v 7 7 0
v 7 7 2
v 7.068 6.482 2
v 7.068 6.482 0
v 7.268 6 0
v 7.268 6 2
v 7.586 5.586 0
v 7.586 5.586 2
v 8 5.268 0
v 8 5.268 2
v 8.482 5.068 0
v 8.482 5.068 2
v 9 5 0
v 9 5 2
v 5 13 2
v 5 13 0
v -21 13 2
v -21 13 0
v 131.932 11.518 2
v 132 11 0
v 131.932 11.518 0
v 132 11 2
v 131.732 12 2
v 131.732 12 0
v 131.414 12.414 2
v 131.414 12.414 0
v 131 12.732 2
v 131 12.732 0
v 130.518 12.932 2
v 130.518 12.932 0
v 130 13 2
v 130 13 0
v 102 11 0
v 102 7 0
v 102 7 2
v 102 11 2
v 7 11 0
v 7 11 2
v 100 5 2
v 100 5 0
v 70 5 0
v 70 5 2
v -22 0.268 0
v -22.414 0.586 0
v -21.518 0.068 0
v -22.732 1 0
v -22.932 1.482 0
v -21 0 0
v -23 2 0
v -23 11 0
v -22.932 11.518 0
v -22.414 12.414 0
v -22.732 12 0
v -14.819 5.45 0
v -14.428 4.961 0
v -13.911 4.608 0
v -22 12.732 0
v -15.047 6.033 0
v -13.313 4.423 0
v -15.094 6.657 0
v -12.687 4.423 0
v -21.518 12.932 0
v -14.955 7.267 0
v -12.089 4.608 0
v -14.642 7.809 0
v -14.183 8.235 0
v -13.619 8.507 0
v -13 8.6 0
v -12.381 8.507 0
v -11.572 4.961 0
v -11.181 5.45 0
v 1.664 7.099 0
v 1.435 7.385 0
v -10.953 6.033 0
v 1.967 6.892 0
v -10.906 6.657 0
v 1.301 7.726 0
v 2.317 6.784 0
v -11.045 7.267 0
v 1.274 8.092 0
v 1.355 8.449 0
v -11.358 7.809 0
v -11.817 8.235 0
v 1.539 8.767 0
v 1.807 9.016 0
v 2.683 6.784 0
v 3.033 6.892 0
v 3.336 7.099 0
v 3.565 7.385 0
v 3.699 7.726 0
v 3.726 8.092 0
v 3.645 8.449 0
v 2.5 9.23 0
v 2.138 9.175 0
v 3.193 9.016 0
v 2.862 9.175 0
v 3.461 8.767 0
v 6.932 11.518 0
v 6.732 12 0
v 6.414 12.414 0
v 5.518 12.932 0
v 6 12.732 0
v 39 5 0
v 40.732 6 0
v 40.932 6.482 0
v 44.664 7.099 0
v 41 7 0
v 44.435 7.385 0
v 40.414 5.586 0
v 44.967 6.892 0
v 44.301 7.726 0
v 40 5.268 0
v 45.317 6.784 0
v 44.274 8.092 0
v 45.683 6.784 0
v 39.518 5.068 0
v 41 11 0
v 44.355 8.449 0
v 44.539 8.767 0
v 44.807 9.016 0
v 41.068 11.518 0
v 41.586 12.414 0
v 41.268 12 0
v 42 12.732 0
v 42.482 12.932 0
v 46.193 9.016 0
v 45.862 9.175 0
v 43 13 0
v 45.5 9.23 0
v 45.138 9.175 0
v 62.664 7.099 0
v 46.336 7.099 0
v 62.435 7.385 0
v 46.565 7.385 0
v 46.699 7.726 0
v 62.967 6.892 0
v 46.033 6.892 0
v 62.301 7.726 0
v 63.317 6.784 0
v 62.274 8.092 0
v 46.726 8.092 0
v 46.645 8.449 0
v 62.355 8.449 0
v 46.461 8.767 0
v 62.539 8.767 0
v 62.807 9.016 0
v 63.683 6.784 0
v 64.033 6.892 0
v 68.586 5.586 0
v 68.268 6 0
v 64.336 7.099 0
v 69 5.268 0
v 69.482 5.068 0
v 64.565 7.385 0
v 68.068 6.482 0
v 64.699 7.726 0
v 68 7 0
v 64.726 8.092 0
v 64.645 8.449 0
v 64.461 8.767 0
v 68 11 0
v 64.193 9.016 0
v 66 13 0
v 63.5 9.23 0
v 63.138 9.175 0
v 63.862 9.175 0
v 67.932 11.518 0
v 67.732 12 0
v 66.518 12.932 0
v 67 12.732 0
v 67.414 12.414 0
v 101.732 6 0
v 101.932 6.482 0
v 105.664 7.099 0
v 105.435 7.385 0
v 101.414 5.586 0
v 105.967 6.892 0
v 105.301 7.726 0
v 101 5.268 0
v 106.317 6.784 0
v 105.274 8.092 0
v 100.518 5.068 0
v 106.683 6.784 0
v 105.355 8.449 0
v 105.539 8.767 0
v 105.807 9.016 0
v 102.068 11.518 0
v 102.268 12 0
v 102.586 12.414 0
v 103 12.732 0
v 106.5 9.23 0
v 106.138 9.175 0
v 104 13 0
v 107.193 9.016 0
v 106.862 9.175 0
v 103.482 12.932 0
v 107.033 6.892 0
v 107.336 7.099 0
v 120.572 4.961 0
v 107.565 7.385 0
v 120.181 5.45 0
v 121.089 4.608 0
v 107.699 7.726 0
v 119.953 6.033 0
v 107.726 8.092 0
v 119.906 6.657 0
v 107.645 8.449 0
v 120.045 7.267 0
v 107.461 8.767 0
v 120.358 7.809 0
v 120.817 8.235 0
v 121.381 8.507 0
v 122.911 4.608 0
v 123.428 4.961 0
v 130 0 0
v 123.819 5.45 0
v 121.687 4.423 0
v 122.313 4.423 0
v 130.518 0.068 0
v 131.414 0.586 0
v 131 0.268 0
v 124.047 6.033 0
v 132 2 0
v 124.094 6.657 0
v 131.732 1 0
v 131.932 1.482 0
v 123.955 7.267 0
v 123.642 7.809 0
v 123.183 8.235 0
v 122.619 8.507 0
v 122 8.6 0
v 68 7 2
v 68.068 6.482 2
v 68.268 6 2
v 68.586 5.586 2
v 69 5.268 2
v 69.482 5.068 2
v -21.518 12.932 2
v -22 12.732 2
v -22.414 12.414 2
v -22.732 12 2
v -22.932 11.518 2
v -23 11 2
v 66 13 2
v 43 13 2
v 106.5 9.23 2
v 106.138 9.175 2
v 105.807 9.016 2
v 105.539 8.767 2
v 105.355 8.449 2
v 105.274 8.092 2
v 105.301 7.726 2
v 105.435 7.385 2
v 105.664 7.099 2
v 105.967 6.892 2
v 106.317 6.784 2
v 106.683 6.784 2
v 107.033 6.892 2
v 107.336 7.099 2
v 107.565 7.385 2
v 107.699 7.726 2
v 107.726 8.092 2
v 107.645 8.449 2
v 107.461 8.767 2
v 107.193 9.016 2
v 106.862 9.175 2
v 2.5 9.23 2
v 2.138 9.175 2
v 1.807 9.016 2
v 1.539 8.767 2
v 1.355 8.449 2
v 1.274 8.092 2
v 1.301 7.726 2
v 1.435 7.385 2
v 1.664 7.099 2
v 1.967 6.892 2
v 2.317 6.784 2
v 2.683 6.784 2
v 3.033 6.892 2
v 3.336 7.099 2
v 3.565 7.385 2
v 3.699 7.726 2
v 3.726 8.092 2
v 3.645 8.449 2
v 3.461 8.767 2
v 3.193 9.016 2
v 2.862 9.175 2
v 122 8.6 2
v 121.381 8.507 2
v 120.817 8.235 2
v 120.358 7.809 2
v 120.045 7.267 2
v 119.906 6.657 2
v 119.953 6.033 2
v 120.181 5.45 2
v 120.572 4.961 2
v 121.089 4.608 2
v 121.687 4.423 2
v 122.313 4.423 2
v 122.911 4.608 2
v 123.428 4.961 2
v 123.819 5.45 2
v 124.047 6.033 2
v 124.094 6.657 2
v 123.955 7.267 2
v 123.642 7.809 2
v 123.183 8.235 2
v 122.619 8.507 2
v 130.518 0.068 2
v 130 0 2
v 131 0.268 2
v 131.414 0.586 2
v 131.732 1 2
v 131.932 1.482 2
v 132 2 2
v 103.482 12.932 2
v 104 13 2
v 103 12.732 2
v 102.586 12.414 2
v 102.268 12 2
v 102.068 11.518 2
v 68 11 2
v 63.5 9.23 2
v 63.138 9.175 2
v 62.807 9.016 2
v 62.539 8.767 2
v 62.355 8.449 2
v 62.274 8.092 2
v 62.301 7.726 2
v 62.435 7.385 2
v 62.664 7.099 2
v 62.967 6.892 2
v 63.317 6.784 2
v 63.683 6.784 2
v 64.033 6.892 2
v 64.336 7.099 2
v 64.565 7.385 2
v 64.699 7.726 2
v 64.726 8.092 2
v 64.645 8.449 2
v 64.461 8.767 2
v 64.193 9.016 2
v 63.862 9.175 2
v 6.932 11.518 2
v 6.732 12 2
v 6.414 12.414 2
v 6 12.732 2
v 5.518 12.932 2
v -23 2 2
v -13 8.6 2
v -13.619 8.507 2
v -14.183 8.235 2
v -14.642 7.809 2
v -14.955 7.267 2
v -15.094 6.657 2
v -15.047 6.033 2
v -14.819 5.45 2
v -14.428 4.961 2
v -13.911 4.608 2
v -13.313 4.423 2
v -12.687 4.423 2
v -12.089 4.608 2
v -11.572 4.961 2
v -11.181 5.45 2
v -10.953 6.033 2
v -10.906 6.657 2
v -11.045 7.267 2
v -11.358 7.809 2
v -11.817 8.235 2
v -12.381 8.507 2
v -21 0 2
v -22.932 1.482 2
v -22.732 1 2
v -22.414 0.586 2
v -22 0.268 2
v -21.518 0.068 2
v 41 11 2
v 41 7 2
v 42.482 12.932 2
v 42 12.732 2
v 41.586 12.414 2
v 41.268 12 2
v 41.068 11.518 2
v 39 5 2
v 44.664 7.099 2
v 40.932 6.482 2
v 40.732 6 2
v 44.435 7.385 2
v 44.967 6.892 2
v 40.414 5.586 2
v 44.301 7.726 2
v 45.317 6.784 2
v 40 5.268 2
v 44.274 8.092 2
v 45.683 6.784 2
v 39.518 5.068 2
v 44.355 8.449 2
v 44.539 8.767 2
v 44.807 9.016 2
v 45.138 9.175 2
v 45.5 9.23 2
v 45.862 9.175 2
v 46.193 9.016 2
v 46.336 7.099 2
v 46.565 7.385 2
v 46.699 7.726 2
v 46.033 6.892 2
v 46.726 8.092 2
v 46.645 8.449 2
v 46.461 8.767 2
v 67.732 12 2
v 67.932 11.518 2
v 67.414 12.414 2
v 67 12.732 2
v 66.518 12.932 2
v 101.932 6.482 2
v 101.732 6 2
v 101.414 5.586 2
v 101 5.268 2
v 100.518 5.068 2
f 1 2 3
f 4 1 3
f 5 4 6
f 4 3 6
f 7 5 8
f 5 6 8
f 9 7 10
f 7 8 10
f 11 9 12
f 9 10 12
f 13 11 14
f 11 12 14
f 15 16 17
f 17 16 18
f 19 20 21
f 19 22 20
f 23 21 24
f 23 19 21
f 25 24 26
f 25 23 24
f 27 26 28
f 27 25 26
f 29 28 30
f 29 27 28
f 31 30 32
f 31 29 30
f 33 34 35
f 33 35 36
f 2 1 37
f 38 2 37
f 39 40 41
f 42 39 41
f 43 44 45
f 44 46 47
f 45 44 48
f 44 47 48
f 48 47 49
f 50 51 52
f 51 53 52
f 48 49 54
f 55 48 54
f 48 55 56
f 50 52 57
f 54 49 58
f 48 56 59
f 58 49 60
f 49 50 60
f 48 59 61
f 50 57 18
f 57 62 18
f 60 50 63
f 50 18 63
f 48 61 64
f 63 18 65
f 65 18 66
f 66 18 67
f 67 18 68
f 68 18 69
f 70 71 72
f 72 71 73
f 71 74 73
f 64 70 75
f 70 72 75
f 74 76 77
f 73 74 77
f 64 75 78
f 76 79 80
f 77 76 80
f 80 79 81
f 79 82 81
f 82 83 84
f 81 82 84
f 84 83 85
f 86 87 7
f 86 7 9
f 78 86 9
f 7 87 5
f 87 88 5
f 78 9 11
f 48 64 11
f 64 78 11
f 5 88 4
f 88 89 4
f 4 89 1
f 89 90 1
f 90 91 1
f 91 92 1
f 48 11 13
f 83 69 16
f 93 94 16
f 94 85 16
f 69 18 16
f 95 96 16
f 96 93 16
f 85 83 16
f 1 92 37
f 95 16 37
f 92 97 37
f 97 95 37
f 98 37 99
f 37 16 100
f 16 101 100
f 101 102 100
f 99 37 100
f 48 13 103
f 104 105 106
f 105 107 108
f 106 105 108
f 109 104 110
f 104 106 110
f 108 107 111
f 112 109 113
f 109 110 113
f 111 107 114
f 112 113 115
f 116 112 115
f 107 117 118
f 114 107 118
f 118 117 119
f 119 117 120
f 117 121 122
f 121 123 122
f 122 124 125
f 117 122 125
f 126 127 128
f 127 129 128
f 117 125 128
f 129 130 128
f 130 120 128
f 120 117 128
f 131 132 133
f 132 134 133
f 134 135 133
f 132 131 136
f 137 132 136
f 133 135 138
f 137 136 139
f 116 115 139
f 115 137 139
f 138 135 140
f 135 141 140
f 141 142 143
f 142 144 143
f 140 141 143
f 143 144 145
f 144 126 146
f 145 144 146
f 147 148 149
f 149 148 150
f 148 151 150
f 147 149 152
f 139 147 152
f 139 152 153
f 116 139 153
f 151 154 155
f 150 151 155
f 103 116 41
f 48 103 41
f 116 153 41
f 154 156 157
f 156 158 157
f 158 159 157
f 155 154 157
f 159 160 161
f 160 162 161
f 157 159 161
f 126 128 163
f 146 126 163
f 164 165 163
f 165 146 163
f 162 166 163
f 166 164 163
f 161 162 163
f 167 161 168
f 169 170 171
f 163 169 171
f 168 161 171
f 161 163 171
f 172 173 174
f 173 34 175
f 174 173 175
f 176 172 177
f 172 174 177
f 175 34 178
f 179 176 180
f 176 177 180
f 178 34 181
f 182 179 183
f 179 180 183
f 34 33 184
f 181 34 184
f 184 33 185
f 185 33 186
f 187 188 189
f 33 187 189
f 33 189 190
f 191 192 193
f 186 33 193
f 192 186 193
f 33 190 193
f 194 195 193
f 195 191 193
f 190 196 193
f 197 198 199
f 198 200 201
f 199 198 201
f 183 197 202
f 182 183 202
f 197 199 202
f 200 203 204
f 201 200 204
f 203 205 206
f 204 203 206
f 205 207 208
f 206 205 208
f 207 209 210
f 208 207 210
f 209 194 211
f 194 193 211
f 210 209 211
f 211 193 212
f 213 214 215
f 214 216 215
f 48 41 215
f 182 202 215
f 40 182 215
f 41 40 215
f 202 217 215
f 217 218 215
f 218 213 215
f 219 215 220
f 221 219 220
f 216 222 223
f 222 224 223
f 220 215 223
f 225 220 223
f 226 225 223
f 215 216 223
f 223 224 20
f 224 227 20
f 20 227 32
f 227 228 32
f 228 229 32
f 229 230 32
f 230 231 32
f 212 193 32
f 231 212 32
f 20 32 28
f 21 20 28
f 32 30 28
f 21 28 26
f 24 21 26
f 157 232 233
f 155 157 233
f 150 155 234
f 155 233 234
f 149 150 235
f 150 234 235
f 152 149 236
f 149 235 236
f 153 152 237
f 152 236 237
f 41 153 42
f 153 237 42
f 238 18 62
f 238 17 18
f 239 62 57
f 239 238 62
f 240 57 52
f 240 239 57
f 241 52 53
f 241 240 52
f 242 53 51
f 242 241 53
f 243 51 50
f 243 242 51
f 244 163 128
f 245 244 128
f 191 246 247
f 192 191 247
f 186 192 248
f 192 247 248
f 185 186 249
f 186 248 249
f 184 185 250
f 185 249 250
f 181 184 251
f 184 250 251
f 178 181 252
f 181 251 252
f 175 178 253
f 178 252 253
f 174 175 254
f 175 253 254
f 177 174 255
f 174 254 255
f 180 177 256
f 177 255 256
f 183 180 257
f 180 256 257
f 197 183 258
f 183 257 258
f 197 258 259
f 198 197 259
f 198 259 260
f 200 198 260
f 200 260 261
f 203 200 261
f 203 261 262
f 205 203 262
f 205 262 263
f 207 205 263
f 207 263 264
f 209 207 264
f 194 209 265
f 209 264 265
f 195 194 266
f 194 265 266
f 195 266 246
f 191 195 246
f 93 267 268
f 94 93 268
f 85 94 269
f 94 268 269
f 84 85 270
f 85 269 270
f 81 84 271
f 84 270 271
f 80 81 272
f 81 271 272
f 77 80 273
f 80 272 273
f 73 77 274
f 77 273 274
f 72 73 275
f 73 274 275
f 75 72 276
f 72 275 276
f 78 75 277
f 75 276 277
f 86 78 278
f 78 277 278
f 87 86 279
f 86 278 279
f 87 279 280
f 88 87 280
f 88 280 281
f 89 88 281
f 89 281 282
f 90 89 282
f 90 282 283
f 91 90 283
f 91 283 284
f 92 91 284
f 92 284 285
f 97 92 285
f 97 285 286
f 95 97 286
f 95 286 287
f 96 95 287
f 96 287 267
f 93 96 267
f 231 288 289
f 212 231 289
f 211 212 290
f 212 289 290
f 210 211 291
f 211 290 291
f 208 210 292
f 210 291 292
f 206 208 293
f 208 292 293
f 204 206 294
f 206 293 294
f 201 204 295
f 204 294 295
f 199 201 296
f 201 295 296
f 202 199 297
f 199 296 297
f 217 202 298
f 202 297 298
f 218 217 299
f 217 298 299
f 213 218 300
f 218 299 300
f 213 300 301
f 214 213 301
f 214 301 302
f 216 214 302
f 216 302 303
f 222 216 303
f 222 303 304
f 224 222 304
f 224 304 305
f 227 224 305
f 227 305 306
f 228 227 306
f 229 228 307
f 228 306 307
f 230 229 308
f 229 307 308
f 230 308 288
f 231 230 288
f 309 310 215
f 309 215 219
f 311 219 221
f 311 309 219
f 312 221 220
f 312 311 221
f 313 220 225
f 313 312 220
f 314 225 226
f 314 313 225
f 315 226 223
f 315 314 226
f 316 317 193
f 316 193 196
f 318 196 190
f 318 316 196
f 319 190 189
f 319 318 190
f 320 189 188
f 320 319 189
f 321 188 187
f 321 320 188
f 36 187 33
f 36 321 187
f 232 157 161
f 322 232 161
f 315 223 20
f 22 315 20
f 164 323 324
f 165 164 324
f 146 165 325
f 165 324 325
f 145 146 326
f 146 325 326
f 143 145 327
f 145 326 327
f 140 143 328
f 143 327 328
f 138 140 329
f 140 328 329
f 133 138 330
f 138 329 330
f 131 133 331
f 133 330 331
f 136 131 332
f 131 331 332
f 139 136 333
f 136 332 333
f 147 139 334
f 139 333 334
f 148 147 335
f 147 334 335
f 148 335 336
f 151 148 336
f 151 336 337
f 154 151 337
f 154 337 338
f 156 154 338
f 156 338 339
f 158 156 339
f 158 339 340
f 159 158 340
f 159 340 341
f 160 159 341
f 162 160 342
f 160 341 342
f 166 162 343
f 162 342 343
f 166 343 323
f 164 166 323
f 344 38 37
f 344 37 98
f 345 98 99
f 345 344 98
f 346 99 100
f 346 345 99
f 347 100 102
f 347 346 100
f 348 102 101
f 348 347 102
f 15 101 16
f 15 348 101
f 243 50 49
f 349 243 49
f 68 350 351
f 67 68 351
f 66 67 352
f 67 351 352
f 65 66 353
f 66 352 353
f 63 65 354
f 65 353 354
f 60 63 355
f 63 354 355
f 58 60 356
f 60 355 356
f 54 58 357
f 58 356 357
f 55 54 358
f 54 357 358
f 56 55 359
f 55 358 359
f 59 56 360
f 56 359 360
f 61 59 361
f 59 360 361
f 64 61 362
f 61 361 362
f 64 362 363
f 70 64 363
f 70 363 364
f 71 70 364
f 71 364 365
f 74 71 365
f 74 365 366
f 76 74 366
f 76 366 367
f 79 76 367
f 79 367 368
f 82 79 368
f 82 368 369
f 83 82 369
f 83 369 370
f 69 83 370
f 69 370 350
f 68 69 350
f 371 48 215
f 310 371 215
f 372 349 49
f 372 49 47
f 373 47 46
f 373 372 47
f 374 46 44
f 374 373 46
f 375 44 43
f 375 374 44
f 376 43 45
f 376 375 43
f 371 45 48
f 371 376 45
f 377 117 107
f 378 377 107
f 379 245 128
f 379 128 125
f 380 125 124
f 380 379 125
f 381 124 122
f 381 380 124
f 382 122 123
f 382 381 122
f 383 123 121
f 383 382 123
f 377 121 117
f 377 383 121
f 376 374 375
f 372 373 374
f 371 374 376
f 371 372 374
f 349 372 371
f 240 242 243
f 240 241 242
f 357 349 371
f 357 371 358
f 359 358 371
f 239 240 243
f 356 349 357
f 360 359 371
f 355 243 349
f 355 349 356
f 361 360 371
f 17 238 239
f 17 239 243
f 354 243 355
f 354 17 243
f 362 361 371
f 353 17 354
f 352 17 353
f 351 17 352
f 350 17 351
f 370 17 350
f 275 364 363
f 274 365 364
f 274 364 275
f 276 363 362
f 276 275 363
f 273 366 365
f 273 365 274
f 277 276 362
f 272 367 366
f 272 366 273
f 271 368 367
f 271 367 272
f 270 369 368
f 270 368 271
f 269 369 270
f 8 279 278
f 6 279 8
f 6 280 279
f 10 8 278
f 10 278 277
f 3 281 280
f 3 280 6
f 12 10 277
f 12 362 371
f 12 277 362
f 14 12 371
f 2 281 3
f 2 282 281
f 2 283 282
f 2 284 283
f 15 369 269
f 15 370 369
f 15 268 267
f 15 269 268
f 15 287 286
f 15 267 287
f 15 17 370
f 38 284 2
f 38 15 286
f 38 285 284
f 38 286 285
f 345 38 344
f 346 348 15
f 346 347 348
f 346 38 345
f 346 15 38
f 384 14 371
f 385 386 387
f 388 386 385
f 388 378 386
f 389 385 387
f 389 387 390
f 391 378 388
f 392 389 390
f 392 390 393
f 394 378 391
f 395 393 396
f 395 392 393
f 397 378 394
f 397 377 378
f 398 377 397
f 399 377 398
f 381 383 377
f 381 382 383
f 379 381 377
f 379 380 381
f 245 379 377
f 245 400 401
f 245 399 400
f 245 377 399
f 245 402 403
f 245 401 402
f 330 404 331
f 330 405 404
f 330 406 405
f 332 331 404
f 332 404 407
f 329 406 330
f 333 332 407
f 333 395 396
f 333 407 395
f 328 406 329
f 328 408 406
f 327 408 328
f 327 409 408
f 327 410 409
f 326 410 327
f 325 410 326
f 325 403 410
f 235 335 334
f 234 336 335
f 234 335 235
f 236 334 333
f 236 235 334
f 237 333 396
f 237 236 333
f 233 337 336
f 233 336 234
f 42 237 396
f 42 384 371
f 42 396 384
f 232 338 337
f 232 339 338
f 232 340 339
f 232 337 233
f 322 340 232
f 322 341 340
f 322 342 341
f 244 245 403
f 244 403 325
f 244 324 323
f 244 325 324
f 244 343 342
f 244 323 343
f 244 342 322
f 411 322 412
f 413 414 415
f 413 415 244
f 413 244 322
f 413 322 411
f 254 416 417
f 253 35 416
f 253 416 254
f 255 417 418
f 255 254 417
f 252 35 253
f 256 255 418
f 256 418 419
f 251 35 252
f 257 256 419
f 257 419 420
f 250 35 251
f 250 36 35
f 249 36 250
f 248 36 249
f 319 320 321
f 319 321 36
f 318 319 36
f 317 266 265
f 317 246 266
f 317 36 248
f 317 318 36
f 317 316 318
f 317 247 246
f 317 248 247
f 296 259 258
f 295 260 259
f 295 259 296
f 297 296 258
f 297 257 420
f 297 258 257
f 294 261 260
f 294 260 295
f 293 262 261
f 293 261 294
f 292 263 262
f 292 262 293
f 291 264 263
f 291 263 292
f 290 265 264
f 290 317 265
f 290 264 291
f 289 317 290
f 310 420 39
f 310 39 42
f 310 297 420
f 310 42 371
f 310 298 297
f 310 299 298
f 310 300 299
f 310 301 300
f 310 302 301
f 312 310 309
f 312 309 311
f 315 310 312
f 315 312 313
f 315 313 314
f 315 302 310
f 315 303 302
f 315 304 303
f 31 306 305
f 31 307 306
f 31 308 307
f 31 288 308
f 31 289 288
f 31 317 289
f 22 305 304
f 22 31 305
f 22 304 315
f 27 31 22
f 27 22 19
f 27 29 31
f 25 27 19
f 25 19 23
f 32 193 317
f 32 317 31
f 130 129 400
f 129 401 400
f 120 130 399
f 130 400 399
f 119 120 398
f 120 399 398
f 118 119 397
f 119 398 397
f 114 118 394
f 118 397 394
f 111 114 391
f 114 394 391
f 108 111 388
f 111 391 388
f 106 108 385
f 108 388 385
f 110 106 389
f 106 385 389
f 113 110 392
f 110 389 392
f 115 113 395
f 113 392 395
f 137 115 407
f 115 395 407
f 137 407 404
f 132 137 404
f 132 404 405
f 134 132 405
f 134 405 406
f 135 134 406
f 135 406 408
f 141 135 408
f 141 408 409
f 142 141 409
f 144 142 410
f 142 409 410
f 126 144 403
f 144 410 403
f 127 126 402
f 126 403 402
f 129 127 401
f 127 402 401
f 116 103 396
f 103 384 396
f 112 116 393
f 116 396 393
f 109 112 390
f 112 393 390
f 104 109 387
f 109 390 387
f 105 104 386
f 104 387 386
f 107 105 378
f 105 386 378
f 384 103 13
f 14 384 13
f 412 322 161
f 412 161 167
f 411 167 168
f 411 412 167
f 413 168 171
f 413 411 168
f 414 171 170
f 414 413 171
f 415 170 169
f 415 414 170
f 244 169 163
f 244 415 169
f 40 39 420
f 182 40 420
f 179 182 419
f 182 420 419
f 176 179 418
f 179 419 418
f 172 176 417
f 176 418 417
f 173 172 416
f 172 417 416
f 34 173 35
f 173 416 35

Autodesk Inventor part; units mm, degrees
ref_plane "YZ Plane" through (0, 0, 0) normal (1, 0, 0) x (0, 1, 0)
ref_plane "XZ Plane" through (0, 0, 0) normal (0, 1, 0) x (-1, 0, 0)
ref_plane "XY Plane" through (0, 0, 0) normal (0, 0, 1) x (1, 0, 0)
sketch "Skizze1" plane through (0, 0, 0) normal (0, 0, 1) x (1, 0, 0)
  circle A0 centre (2.5, 77) radius 1.875 construction
  circle A1 centre (45.5, 77) radius 1.875 construction
  circle A2 centre (2.5, 8) radius 1.875 construction
  circle A3 centre (45.5, 8) radius 1.875 construction
  line L0 (-1, 5) -> (-1, 80) construction
  line L1 (49, 5) -> (-1, 5) construction
  line L2 (49, 80) -> (49, 5) construction
  line L3 (-1, 80) -> (49, 80) construction
  circle A4 centre (63.5, 77) radius 1.875 construction
  circle A5 centre (106.5, 77) radius 1.875 construction
  circle A6 centre (63.5, 8) radius 1.875 construction
  circle A7 centre (106.5, 8) radius 1.875 construction
  line L4 (60, 5) -> (60, 80) construction
  line L5 (110, 5) -> (60, 5) construction
  line L6 (110, 80) -> (110, 5) construction
  line L7 (60, 80) -> (110, 80) construction
  line L8 (-3, 0) -> (-3, 85) construction
  line L9 (-23, 0) -> (-23, 85) construction
  line L10 (-16.375, 0) -> (-21, 0) construction
  line L11 (-23, 0) -> (-21, 0) construction
  line L12 (-16.375, 0) -> (-15.575, 0) construction
  line L13 (0, 0) -> (-9.625, 0) construction
  line L14 (118.625, 85) -> (114, 85) construction
  line L15 (114, 0) -> (114, 85) construction
  line L16 (118.625, 0) -> (114, 0) construction
  line L17 (118.625, 0) -> (118.625, 85) construction
  line L18 (112, 0) -> (114, 0) construction
  line L19 (112, 0) -> (112, 85) construction
  line L20 (132, 0) -> (132, 85) construction
  line L21 (130, 0) -> (132, 0) construction
  line L22 (-23, 0) -> (132, 0)
  line L23 (132, 0) -> (132, 5)
  line L24 (132, 5) -> (-23, 5)
  line L25 (-23, 5) -> (-23, 0)
  line L26 (102, 13) -> (132, 13)
  line L27 (132, 13) -> (132, 5)
  line L28 (132, 5) -> (102, 5)
  line L29 (102, 5) -> (102, 13)
  line L30 (41, 5) -> (68, 5)
  line L31 (68, 5) -> (68, 13)
  line L32 (68, 13) -> (41, 13)
  line L33 (41, 13) -> (41, 5)
  line L34 (-23, 5) -> (7, 5)
  line L35 (7, 5) -> (7, 13)
  line L36 (7, 13) -> (-23, 13)
  line L37 (-23, 13) -> (-23, 5)
  line L38 (49, 5) -> (60, 5) construction
  line L39 (54.5, 0.9478) -> (54.5, 9.0522) construction
  line L40 (130, 0) -> (114, 0) construction
  line L41 (114, 0) -> (114, 13) construction
  line L42 (114, 13) -> (130, 13) construction
  line L43 (130, 13) -> (130, 0) construction
  line L44 (130, 0) -> (114, 13) construction
  line L45 (114, 0) -> (130, 13) construction
  line L46 (-23, 0) -> (-3, 0) construction
  line L47 (-3, 0) -> (-3, 13) construction
  line L48 (-3, 13) -> (-23, 13) construction
  line L49 (-23, 13) -> (-23, 0) construction
  line L50 (-23, 0) -> (-3, 13) construction
  line L51 (-3, 0) -> (-23, 13) construction
  point P0 (54.5, 5)
  point P1 (122, 6.5)
  point P2 (-13, 6.5)
  dimension "d0" = 8
  dimension "d1" = 8
  dimension "d2" = 8
extrude "Extrusion1" add sketch "Skizze1" along normal blind 2
sketch "Skizze2" plane through (0, 0, 0) normal (0, 0, -1) x (-1, 0, 0)
  point P0 (0, 0)
  point P1 (-106.5, 8)
  point P2 (-63.5, 8)
  point P3 (-45.5, 8)
  point P4 (-2.5, 8)
hole "Bohrung1" at (106.5, 8, 0) at (63.5, 8, 0) at (45.5, 8, 0) at (2.5, 8, 0) direction (0, 0, 1) diameter 2.459 end through all thread size "M3x0.5" class "6H" standard "ANSI Metric M Profile"
fillet "Rundung1" radius 2 12 edges at (102, 5, 1) (102, 13, 1) (68, 5, 1) (68, 13, 1) (41, 13, 1) (41, 5, 1) (7, 5, 1) (7, 13, 1) (-23, 13, 1) (-23, 0, 1) (132, 0, 1) (132, 13, 1)
sketch "Skizze3" plane through (0, 0, 0) normal (0, 0, -1) x (-1, 0, 0)
  point P0 (0, 0)
  point P1 (13, 6.5)
  point P2 (-122, 6.5)
hole "Bohrung2" at (-13, 6.5, 0) at (122, 6.5, 0) direction (0, 0, 1) diameter 4.2 end through all
properties part number "DriverMount" material "Aluminium 6061"
